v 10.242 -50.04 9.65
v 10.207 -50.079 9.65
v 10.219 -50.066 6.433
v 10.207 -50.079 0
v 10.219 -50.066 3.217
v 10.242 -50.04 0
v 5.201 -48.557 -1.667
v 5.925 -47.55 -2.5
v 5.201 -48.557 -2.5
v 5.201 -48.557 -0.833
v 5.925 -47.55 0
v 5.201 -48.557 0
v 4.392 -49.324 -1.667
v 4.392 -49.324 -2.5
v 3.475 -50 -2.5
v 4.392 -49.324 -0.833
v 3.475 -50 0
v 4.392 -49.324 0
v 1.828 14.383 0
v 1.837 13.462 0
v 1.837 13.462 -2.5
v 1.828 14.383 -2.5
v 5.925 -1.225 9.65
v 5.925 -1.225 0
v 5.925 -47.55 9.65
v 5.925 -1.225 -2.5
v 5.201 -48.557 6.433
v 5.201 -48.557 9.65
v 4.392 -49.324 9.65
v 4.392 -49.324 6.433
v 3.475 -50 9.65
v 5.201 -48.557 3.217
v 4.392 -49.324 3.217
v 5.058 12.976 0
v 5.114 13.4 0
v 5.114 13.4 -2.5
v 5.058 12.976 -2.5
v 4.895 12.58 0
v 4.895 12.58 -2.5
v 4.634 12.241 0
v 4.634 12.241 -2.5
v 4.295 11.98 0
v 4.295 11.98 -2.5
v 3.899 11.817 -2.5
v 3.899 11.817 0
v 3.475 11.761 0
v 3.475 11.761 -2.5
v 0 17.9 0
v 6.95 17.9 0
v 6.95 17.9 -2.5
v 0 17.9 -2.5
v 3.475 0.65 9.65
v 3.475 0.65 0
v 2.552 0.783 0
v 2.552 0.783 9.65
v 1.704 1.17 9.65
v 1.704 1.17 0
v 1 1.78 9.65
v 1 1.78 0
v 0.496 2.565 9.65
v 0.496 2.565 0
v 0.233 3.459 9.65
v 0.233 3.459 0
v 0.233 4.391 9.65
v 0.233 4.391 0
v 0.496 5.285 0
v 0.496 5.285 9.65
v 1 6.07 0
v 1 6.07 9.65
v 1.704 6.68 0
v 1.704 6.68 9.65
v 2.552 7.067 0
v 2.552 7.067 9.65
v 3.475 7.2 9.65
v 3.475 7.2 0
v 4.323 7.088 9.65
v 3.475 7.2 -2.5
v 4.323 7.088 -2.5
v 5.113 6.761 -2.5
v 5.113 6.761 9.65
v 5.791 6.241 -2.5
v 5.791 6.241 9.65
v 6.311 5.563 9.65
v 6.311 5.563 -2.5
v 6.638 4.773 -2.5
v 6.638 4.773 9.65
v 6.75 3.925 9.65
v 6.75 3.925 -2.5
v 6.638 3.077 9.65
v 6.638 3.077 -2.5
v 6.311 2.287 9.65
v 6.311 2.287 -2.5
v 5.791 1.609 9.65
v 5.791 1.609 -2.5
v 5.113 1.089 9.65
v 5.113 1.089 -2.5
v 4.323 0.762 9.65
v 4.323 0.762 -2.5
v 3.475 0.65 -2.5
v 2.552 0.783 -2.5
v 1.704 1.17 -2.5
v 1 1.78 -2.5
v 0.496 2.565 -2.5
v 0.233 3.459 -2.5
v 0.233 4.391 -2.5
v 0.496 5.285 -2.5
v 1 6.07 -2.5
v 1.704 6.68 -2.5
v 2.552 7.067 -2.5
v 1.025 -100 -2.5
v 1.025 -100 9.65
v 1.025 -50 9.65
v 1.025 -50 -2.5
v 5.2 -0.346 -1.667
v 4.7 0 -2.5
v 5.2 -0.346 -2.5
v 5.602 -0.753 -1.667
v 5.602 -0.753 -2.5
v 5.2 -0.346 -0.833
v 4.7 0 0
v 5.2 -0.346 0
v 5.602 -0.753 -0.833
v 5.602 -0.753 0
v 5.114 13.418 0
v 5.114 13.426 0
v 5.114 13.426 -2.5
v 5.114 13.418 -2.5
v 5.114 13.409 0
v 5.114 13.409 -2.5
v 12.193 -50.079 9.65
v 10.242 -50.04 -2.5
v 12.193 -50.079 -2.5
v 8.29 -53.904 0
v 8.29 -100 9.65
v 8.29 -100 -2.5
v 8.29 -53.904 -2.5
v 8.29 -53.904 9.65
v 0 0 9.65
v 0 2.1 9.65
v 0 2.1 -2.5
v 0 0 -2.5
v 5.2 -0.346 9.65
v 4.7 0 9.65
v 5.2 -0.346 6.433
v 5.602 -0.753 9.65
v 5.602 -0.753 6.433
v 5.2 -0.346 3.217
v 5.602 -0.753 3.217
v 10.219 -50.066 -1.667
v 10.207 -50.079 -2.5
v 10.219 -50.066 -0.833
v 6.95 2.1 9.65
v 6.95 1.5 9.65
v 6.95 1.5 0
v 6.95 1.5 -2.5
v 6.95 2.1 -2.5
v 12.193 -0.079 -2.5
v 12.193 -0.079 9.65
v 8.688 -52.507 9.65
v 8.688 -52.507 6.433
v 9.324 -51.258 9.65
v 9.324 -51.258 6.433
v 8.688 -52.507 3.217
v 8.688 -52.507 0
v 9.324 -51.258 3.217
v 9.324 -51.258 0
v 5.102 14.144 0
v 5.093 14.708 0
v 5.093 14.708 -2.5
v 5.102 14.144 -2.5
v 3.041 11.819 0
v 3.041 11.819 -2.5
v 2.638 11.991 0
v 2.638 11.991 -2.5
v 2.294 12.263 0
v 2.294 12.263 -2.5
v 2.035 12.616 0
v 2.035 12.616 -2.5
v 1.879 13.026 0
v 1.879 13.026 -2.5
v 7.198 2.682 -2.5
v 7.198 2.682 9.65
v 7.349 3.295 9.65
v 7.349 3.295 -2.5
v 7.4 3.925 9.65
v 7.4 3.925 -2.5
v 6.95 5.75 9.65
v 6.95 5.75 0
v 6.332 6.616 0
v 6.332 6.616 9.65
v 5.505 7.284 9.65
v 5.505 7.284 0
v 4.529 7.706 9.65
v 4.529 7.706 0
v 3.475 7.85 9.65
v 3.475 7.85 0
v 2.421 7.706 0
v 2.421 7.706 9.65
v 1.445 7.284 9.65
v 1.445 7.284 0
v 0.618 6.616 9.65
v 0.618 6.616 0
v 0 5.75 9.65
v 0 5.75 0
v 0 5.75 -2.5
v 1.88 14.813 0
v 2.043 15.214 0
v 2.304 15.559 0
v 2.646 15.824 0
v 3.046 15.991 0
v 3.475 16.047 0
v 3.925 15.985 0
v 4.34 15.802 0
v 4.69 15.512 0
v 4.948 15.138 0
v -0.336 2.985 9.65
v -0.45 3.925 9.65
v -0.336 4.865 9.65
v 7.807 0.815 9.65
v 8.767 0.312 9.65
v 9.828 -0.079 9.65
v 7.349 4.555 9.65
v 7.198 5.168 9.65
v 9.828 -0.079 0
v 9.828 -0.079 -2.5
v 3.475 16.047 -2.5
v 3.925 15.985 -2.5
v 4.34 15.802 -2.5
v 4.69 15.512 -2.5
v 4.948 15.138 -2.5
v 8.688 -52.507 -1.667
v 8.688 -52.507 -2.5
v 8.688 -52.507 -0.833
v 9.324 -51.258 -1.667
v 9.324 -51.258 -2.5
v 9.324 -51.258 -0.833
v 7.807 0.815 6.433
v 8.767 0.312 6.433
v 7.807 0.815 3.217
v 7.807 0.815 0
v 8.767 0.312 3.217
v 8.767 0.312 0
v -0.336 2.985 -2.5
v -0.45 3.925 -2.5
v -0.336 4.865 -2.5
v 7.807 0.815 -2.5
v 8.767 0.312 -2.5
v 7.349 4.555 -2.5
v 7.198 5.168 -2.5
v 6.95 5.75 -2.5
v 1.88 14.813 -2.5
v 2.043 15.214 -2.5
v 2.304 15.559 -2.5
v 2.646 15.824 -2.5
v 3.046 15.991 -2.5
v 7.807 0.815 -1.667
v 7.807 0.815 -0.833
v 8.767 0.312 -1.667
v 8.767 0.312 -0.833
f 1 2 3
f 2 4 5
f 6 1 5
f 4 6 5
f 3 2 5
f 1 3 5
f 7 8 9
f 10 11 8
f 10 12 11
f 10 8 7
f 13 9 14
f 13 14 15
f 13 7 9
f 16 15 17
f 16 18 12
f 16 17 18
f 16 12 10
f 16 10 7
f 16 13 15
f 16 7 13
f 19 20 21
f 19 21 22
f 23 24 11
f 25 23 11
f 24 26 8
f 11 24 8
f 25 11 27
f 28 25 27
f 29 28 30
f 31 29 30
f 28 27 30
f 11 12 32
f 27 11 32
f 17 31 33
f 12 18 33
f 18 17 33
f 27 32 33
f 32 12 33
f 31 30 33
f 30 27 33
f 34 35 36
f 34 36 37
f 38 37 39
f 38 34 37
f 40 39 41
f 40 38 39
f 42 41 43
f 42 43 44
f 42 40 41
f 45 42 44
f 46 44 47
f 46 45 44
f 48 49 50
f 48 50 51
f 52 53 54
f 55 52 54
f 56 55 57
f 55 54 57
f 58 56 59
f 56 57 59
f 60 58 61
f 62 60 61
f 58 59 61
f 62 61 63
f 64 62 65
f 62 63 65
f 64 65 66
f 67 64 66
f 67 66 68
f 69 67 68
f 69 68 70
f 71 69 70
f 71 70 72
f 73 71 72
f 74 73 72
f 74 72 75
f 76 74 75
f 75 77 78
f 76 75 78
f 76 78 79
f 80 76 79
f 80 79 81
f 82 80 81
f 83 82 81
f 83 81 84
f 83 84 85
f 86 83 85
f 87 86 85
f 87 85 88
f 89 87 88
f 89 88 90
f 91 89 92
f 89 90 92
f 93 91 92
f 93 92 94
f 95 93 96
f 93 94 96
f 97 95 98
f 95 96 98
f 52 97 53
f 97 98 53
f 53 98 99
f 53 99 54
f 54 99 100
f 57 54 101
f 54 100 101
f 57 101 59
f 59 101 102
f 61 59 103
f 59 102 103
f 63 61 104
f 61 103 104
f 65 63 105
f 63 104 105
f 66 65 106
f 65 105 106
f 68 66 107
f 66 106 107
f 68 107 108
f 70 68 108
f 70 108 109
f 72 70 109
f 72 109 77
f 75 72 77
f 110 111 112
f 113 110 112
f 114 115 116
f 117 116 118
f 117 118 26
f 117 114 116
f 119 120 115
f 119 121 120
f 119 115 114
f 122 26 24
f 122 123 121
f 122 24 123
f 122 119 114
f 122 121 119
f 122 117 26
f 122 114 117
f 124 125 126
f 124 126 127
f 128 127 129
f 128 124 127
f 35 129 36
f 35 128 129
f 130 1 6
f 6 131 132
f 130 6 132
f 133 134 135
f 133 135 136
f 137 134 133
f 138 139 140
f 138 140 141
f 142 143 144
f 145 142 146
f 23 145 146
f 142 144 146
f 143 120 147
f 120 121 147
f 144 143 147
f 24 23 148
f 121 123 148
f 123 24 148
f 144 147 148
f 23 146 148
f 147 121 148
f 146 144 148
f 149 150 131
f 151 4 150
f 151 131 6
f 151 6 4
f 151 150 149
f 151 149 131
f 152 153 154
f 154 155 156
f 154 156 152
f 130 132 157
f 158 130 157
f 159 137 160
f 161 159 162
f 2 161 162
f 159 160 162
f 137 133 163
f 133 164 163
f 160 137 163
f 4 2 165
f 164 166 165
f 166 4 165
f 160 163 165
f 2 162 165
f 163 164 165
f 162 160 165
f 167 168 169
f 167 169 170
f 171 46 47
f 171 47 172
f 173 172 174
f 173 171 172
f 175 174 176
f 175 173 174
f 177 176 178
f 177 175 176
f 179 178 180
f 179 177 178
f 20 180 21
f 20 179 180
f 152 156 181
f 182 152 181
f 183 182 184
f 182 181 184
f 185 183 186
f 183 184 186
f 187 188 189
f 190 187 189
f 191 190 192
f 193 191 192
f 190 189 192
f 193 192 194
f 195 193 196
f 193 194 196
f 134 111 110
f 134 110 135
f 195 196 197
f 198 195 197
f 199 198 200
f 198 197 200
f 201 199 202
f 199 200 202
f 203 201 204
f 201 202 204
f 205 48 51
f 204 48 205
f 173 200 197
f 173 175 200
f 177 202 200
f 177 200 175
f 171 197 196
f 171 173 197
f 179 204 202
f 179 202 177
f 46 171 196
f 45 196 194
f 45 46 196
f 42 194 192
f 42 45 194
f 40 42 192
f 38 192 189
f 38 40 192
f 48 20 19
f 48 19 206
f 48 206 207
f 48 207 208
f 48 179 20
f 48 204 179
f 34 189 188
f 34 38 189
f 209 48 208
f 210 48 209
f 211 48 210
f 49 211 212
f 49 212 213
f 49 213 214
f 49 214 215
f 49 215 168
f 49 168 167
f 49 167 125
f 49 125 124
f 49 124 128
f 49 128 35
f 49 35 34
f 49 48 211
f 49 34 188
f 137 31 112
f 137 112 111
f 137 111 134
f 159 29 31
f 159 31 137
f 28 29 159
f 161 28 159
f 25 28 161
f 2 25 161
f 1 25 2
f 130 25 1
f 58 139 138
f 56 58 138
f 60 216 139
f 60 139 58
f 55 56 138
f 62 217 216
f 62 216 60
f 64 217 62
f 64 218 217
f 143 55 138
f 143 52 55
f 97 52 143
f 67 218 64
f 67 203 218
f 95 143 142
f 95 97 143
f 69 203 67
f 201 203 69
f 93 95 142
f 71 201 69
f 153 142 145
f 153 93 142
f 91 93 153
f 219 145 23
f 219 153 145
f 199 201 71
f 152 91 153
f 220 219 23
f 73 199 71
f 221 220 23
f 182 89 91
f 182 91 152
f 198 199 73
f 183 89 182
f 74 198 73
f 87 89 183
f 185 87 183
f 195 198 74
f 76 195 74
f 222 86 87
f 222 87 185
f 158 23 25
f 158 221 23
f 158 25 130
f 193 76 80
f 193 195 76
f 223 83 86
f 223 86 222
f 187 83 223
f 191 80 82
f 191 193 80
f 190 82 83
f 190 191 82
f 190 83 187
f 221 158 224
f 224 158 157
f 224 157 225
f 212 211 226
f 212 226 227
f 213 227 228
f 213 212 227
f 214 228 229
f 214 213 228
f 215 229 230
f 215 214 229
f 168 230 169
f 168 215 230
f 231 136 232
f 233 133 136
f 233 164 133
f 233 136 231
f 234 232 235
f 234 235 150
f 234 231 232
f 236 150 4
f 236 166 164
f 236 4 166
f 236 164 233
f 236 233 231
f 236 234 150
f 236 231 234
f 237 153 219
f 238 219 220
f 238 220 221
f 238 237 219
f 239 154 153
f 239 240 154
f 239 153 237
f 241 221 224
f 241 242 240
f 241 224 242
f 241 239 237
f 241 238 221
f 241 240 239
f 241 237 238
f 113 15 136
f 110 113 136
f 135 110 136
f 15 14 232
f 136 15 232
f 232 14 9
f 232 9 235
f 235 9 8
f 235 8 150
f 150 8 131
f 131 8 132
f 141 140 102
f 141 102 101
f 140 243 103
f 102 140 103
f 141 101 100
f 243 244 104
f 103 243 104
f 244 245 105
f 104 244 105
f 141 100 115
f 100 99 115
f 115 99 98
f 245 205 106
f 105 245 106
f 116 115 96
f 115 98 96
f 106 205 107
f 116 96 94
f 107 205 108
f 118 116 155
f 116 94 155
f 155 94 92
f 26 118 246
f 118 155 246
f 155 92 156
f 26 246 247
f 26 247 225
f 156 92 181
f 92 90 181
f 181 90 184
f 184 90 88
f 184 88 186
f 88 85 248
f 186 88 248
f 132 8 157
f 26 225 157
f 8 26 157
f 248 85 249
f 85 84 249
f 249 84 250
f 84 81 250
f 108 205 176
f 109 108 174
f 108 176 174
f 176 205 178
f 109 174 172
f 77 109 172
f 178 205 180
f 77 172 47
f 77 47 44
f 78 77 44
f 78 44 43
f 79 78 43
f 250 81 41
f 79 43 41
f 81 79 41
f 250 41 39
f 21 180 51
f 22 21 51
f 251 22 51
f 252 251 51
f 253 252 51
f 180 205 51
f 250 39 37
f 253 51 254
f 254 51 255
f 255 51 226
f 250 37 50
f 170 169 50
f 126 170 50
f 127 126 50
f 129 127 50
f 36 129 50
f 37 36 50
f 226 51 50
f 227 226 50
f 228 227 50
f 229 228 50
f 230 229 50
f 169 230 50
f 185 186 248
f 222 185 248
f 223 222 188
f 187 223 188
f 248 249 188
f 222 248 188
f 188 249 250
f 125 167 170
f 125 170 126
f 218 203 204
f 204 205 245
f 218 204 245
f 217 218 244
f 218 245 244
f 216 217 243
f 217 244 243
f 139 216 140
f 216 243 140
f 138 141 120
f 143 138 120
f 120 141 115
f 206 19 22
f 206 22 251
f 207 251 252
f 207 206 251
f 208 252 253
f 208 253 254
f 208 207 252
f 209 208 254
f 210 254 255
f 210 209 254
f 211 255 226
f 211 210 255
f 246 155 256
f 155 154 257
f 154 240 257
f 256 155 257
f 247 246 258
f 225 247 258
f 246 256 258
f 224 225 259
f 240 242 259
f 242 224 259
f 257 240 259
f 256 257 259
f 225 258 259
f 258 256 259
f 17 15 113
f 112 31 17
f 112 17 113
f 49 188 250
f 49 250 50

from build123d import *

# Parameters (mm, degrees)
F0_W     = 2.45
F0_H     = 50
F1_DEPTH = 2.5
F2_DEPTH = 9.65
F3_DEPTH = 2.5
F4_DEPTH = 9.65
F5_DEPTH = 9.65
F6_DEPTH = 2.5


with BuildPart() as f1:
    # F0 (on Top) → F1 (new body)
    with BuildSketch(Plane.XY):
        with BuildLine():
            Line((0, 2.1001712409), (0, 0))
            Line((0, 0), (1.025, 0))
            Line((1.025, 0), (1.025, 0.8585484677))
            ThreePointArc((1.025, 0.8585484677), (0.4481513041, 1.426237912), (0, 2.1001712409))
        make_face()
        with BuildLine():
            Line((1.025, 0.8585484677), (1.025, 0))
            Line((1.025, 0), (3.475, 0))
            ThreePointArc((3.475, 0), (2.1769624937, 0.2208504846), (1.025, 0.8585484677))
        make_face()
        with BuildLine():
            ThreePointArc((0, 5.7498287591), (-0.45, 3.925), (0, 2.1001712409))
            Line((0, 2.1001712409), (0, 5.7498287591))
        make_face()
        with BuildLine():
            Line((0, 5.7498287591), (0, 2.1001712409))
            ThreePointArc((0, 2.1001712409), (0.4481513041, 1.426237912), (1.025, 0.8585484677))
            ThreePointArc((1.025, 0.8585484677), (2.1769624937, 0.2208504846), (3.475, 0))
            Line((3.475, 0), (3.475, 0.65))
            ThreePointArc((3.475, 0.65), (0.2, 3.925), (3.475, 7.2))
            Line((3.475, 7.2), (3.475, 7.85))
            ThreePointArc((3.475, 7.85), (1.4448310267, 7.2841723593), (0, 5.7498287591))
        make_face()
        with BuildLine():
            ThreePointArc((5.925, 0.8585484677), (4.7730375063, 0.2208504846), (3.475, 0))
            Line((3.475, 0), (4.7, 0))
            Line((4.7, 0), (5.925, 0))
            Line((5.925, 0), (5.925, 0.8585484677))
        make_face()
        with BuildLine():
            Line((3.475, 0.65), (3.475, 0))
            ThreePointArc((3.475, 0), (4.7730375063, 0.2208504846), (5.925, 0.8585484677))
            ThreePointArc((5.925, 0.8585484677), (6.5018486959, 1.426237912), (6.95, 2.1001712409))
            Line((6.95, 2.1001712409), (6.95, 5.7498287591))
            ThreePointArc((6.95, 5.7498287591), (5.5051689733, 7.2841723593), (3.475, 7.85))
            Line((3.475, 7.85), (3.475, 7.2))
            ThreePointArc((3.475, 7.2), (5.7907747084, 6.2407747084), (6.75, 3.925))
            ThreePointArc((6.75, 3.925), (5.7907747084, 1.6092252916), (3.475, 0.65))
        make_face()
        with BuildLine():
            Line((0, 7.85), (0, 5.7498287591))
            ThreePointArc((0, 5.7498287591), (1.4448310267, 7.2841723593), (3.475, 7.85))
            ThreePointArc((3.475, 7.85), (5.5051689733, 7.2841723593), (6.95, 5.7498287591))
            Line((6.95, 5.7498287591), (6.95, 17.9))
            Line((6.95, 17.9), (3.475, 17.9))
            Line((3.475, 17.9), (0, 17.9))
            Line((0, 17.9), (0, 7.85))
        make_face()
        with BuildLine():
            ThreePointArc((1.8276640256, 14.3833613398), (2.3042302705, 15.55900427), (3.475, 16.0474200003))
            ThreePointArc((3.475, 16.0474200003), (4.5253988967, 15.6691157612), (5.0933824344, 14.7079463483))
            Line((5.0933824344, 14.7079463483), (5.1024433757, 14.1442252627))
            Line((5.1024433757, 14.1442252627), (5.113982201, 13.4263440945))
            ThreePointArc((5.113982201, 13.4263440945), (5.1141409801, 13.4131724726), (5.1141939076, 13.4))
            ThreePointArc((5.1141939076, 13.4), (4.6340851277, 12.2409148723), (3.475, 11.7608060924))
            ThreePointArc((3.475, 11.7608060924), (2.2942628451, 12.2629791393), (1.8369719791, 13.4618131819))
            Line((1.8369719791, 13.4618131819), (1.8276640256, 14.3833613398))
        make_face(mode=Mode.SUBTRACT)
        with BuildLine():
            Line((5.925, 0), (4.7, 0))
            add(Edge.make_bspline(
                [(4.7, 0), (5.2537494339, -0.3164176305), (5.6369397789, -0.7196032093), (5.925, -1.225)],
                knots=[0, 0, 0, 0, 1.7324116139, 1.7324116139, 1.7324116139, 1.7324116139], degree=3))
            Line((5.925, -1.225), (5.925, -0.079424061))
            Line((5.925, -0.079424061), (5.925, 0))
        make_face()
        with BuildLine():
            ThreePointArc((6.95, 2.1001712409), (6.5018486959, 1.426237912), (5.925, 0.8585484677))
            Line((5.925, 0.8585484677), (5.925, 0))
            Line((5.925, 0), (6.95, 0))
            Line((6.95, 0), (6.95, 1.44))
            Line((6.95, 1.44), (6.95, 1.5))
            Line((6.95, 1.5), (6.95, 2.1001712409))
        make_face()
        Polygon((6.95, 0), (5.925, 0), (5.925, -0.079424061), (5.925, -1.225), (5.925, -21.3844068348), (5.925, -22.55), (5.925, -22.9875), (5.925, -25), (9.8284865708, -25), (9.8284865708, -0.079424061), align=None)
        with BuildLine():
            Line((6.95, 5.7498287591), (6.95, 2.1001712409))
            ThreePointArc((6.95, 2.1001712409), (7.2858398025, 2.9852526935), (7.4, 3.925))
            ThreePointArc((7.4, 3.925), (7.2858398025, 4.8647473065), (6.95, 5.7498287591))
        make_face()
        with BuildLine():
            Line((6.95, 1.44), (6.95, 0))
            Line((6.95, 0), (9.8284865708, -0.079424061))
            add(Edge.make_bspline(
                [(6.95, 1.5), (7.7566024847, 0.7003984647), (8.7155010551, 0.2800084476), (9.8284865708, -0.079424061)],
                knots=[0, 0, 0, 0, 3.2833314336, 3.2833314336, 3.2833314336, 3.2833314336], degree=3))
            Line((6.95, 1.5), (6.95, 1.44))
        make_face()
        Polygon((12.1934865708, -0.079424061), (9.8284865708, -0.079424061), (9.8284865708, -25), (9.8284865708, -50.0313035152), (10.2417432854, -50.0397120305), (12.1934865708, -50.079424061), align=None)
        Polygon((9.8284865708, -25), (5.925, -25), (5.925, -26.9515), (5.925, -28.903), (5.925, -47.55), (5.925, -50), (8.29, -50), (9.8284865708, -50.0313035152), align=None)
        with Locations((2.25, -75)):
            Rectangle(F0_W, F0_H)
        with BuildLine():
            Line((10.2417432854, -50.0397120305), (9.8284865708, -50.0313035152))
            Line((9.8284865708, -50.0313035152), (9.8284865708, -50.0397120305))
            Line((9.8284865708, -50.0397120305), (9.8284865708, -50.079424061))
            Line((9.8284865708, -50.079424061), (10.207343012, -50.079424061))
            add(Edge.make_bspline(
                [(10.207343012, -50.079424061), (10.2187605889, -50.0661890592), (10.230227327, -50.0529518896), (10.2417432854, -50.0397120305)],
                knots=[4.2808358806, 4.2808358806, 4.2808358806, 4.2808358806, 4.3292058583, 4.3292058583, 4.3292058583, 4.3292058583], degree=3))
        make_face()
        Polygon((9.8284865708, -50.0397120305), (9.8284865708, -50.0313035152), (8.29, -50), (8.29, -50.0240602729), align=None)
        Polygon((5.925, -50), (3.475, -50), (3.475, -100), (5.925, -100), (5.925, -52.0125), align=None)
        with BuildLine():
            add(Edge.make_bspline(
                [(5.925, -47.55), (5.2342489362, -48.7282052636), (4.4546769932, -49.3181198835), (3.475, -50)],
                knots=[0, 0, 0, 0, 3.4648232278, 3.4648232278, 3.4648232278, 3.4648232278], degree=3))
            Line((3.475, -50), (5.925, -50))
            Line((5.925, -50), (5.925, -47.55))
        make_face()
        with BuildLine():
            Line((9.8284865708, -50.079424061), (9.8284865708, -50.0397120305))
            Line((9.8284865708, -50.0397120305), (8.29, -50.0240602729))
            Line((8.29, -50.0240602729), (8.29, -53.904))
            add(Edge.make_bspline(
                [(8.29, -53.904), (8.5714472143, -52.4050904341), (9.1968655396, -51.250747129), (10.207343012, -50.079424061)],
                knots=[0, 0, 0, 0, 4.2808358806, 4.2808358806, 4.2808358806, 4.2808358806], degree=3))
            Line((10.207343012, -50.079424061), (9.8284865708, -50.079424061))
        make_face()
        Polygon((8.29, -50.0240602729), (8.29, -50), (5.925, -50), align=None)
        Polygon((8.29, -50.0240602729), (5.925, -50), (5.925, -52.0125), (5.925, -100), (8.29, -100), (8.29, -53.904), align=None)
    extrude(amount=-F1_DEPTH)

    # F0 (on Top) → F2 (join)
    with BuildSketch(Plane.XY):
        with BuildLine():
            Line((3.475, 0.65), (3.475, 0))
            ThreePointArc((3.475, 0), (4.7730375063, 0.2208504846), (5.925, 0.8585484677))
            ThreePointArc((5.925, 0.8585484677), (6.5018486959, 1.426237912), (6.95, 2.1001712409))
            Line((6.95, 2.1001712409), (6.95, 5.7498287591))
            ThreePointArc((6.95, 5.7498287591), (5.5051689733, 7.2841723593), (3.475, 7.85))
            Line((3.475, 7.85), (3.475, 7.2))
            ThreePointArc((3.475, 7.2), (5.7907747084, 6.2407747084), (6.75, 3.925))
            ThreePointArc((6.75, 3.925), (5.7907747084, 1.6092252916), (3.475, 0.65))
        make_face()
        with BuildLine():
            Line((0, 5.7498287591), (0, 2.1001712409))
            ThreePointArc((0, 2.1001712409), (0.4481513041, 1.426237912), (1.025, 0.8585484677))
            ThreePointArc((1.025, 0.8585484677), (2.1769624937, 0.2208504846), (3.475, 0))
            Line((3.475, 0), (3.475, 0.65))
            ThreePointArc((3.475, 0.65), (0.2, 3.925), (3.475, 7.2))
            Line((3.475, 7.2), (3.475, 7.85))
            ThreePointArc((3.475, 7.85), (1.4448310267, 7.2841723593), (0, 5.7498287591))
        make_face()
        with BuildLine():
            Line((6.95, 5.7498287591), (6.95, 2.1001712409))
            ThreePointArc((6.95, 2.1001712409), (7.2858398025, 2.9852526935), (7.4, 3.925))
            ThreePointArc((7.4, 3.925), (7.2858398025, 4.8647473065), (6.95, 5.7498287591))
        make_face()
        with BuildLine():
            ThreePointArc((0, 5.7498287591), (-0.45, 3.925), (0, 2.1001712409))
            Line((0, 2.1001712409), (0, 5.7498287591))
        make_face()
        with BuildLine():
            Line((6.95, 1.44), (6.95, 0))
            Line((6.95, 0), (9.8284865708, -0.079424061))
            add(Edge.make_bspline(
                [(6.95, 1.5), (7.7566024847, 0.7003984647), (8.7155010551, 0.2800084476), (9.8284865708, -0.079424061)],
                knots=[0, 0, 0, 0, 3.2833314336, 3.2833314336, 3.2833314336, 3.2833314336], degree=3))
            Line((6.95, 1.5), (6.95, 1.44))
        make_face()
        with BuildLine():
            ThreePointArc((6.95, 2.1001712409), (6.5018486959, 1.426237912), (5.925, 0.8585484677))
            Line((5.925, 0.8585484677), (5.925, 0))
            Line((5.925, 0), (6.95, 0))
            Line((6.95, 0), (6.95, 1.44))
            Line((6.95, 1.44), (6.95, 1.5))
            Line((6.95, 1.5), (6.95, 2.1001712409))
        make_face()
        with BuildLine():
            ThreePointArc((5.925, 0.8585484677), (4.7730375063, 0.2208504846), (3.475, 0))
            Line((3.475, 0), (4.7, 0))
            Line((4.7, 0), (5.925, 0))
            Line((5.925, 0), (5.925, 0.8585484677))
        make_face()
        with BuildLine():
            Line((1.025, 0.8585484677), (1.025, 0))
            Line((1.025, 0), (3.475, 0))
            ThreePointArc((3.475, 0), (2.1769624937, 0.2208504846), (1.025, 0.8585484677))
        make_face()
        with BuildLine():
            Line((0, 2.1001712409), (0, 0))
            Line((0, 0), (1.025, 0))
            Line((1.025, 0), (1.025, 0.8585484677))
            ThreePointArc((1.025, 0.8585484677), (0.4481513041, 1.426237912), (0, 2.1001712409))
        make_face()
        Polygon((6.95, 0), (5.925, 0), (5.925, -0.079424061), (5.925, -1.225), (5.925, -21.3844068348), (5.925, -22.55), (5.925, -22.9875), (5.925, -25), (9.8284865708, -25), (9.8284865708, -0.079424061), align=None)
        with BuildLine():
            Line((5.925, 0), (4.7, 0))
            add(Edge.make_bspline(
                [(4.7, 0), (5.2537494339, -0.3164176305), (5.6369397789, -0.7196032093), (5.925, -1.225)],
                knots=[0, 0, 0, 0, 1.7324116139, 1.7324116139, 1.7324116139, 1.7324116139], degree=3))
            Line((5.925, -1.225), (5.925, -0.079424061))
            Line((5.925, -0.079424061), (5.925, 0))
        make_face()
        Polygon((9.8284865708, -25), (5.925, -25), (5.925, -26.9515), (5.925, -28.903), (5.925, -47.55), (5.925, -50), (8.29, -50), (9.8284865708, -50.0313035152), align=None)
        with BuildLine():
            add(Edge.make_bspline(
                [(5.925, -47.55), (5.2342489362, -48.7282052636), (4.4546769932, -49.3181198835), (3.475, -50)],
                knots=[0, 0, 0, 0, 3.4648232278, 3.4648232278, 3.4648232278, 3.4648232278], degree=3))
            Line((3.475, -50), (5.925, -50))
            Line((5.925, -50), (5.925, -47.55))
        make_face()
        Polygon((8.29, -50.0240602729), (5.925, -50), (5.925, -52.0125), (5.925, -100), (8.29, -100), (8.29, -53.904), align=None)
        Polygon((5.925, -50), (3.475, -50), (3.475, -100), (5.925, -100), (5.925, -52.0125), align=None)
        with Locations((2.25, -75)):
            Rectangle(F0_W, F0_H)
    extrude(amount=F2_DEPTH)

    # F0 (on Top) → F3 (join)
    with BuildSketch(Plane.XY):
        Polygon((12.1934865708, -0.079424061), (9.8284865708, -0.079424061), (9.8284865708, -25), (9.8284865708, -50.0313035152), (10.2417432854, -50.0397120305), (12.1934865708, -50.079424061), align=None)
        Polygon((8.29, -50.0240602729), (5.925, -50), (5.925, -52.0125), (5.925, -100), (8.29, -100), (8.29, -53.904), align=None)
        with BuildLine():
            Line((9.8284865708, -50.079424061), (9.8284865708, -50.0397120305))
            Line((9.8284865708, -50.0397120305), (8.29, -50.0240602729))
            Line((8.29, -50.0240602729), (8.29, -53.904))
            add(Edge.make_bspline(
                [(8.29, -53.904), (8.5714472143, -52.4050904341), (9.1968655396, -51.250747129), (10.207343012, -50.079424061)],
                knots=[0, 0, 0, 0, 4.2808358806, 4.2808358806, 4.2808358806, 4.2808358806], degree=3))
            Line((10.207343012, -50.079424061), (9.8284865708, -50.079424061))
        make_face()
    extrude(amount=-F3_DEPTH)

    # F0 (on Top) → F4 (join)
    with BuildSketch(Plane.XY):
        with BuildLine():
            Line((0, 2.1001712409), (0, 0))
            Line((0, 0), (1.025, 0))
            Line((1.025, 0), (1.025, 0.8585484677))
            ThreePointArc((1.025, 0.8585484677), (0.4481513041, 1.426237912), (0, 2.1001712409))
        make_face()
        with BuildLine():
            Line((1.025, 0.8585484677), (1.025, 0))
            Line((1.025, 0), (3.475, 0))
            ThreePointArc((3.475, 0), (2.1769624937, 0.2208504846), (1.025, 0.8585484677))
        make_face()
        with BuildLine():
            ThreePointArc((0, 5.7498287591), (-0.45, 3.925), (0, 2.1001712409))
            Line((0, 2.1001712409), (0, 5.7498287591))
        make_face()
        with BuildLine():
            Line((0, 5.7498287591), (0, 2.1001712409))
            ThreePointArc((0, 2.1001712409), (0.4481513041, 1.426237912), (1.025, 0.8585484677))
            ThreePointArc((1.025, 0.8585484677), (2.1769624937, 0.2208504846), (3.475, 0))
            Line((3.475, 0), (3.475, 0.65))
            ThreePointArc((3.475, 0.65), (0.2, 3.925), (3.475, 7.2))
            Line((3.475, 7.2), (3.475, 7.85))
            ThreePointArc((3.475, 7.85), (1.4448310267, 7.2841723593), (0, 5.7498287591))
        make_face()
        with BuildLine():
            ThreePointArc((5.925, 0.8585484677), (4.7730375063, 0.2208504846), (3.475, 0))
            Line((3.475, 0), (4.7, 0))
            Line((4.7, 0), (5.925, 0))
            Line((5.925, 0), (5.925, 0.8585484677))
        make_face()
        with BuildLine():
            Line((3.475, 0.65), (3.475, 0))
            ThreePointArc((3.475, 0), (4.7730375063, 0.2208504846), (5.925, 0.8585484677))
            ThreePointArc((5.925, 0.8585484677), (6.5018486959, 1.426237912), (6.95, 2.1001712409))
            Line((6.95, 2.1001712409), (6.95, 5.7498287591))
            ThreePointArc((6.95, 5.7498287591), (5.5051689733, 7.2841723593), (3.475, 7.85))
            Line((3.475, 7.85), (3.475, 7.2))
            ThreePointArc((3.475, 7.2), (5.7907747084, 6.2407747084), (6.75, 3.925))
            ThreePointArc((6.75, 3.925), (5.7907747084, 1.6092252916), (3.475, 0.65))
        make_face()
        with BuildLine():
            Line((5.925, 0), (4.7, 0))
            add(Edge.make_bspline(
                [(4.7, 0), (5.2537494339, -0.3164176305), (5.6369397789, -0.7196032093), (5.925, -1.225)],
                knots=[0, 0, 0, 0, 1.7324116139, 1.7324116139, 1.7324116139, 1.7324116139], degree=3))
            Line((5.925, -1.225), (5.925, -0.079424061))
            Line((5.925, -0.079424061), (5.925, 0))
        make_face()
        with BuildLine():
            ThreePointArc((6.95, 2.1001712409), (6.5018486959, 1.426237912), (5.925, 0.8585484677))
            Line((5.925, 0.8585484677), (5.925, 0))
            Line((5.925, 0), (6.95, 0))
            Line((6.95, 0), (6.95, 1.44))
            Line((6.95, 1.44), (6.95, 1.5))
            Line((6.95, 1.5), (6.95, 2.1001712409))
        make_face()
        Polygon((6.95, 0), (5.925, 0), (5.925, -0.079424061), (5.925, -1.225), (5.925, -21.3844068348), (5.925, -22.55), (5.925, -22.9875), (5.925, -25), (9.8284865708, -25), (9.8284865708, -0.079424061), align=None)
        with BuildLine():
            Line((6.95, 5.7498287591), (6.95, 2.1001712409))
            ThreePointArc((6.95, 2.1001712409), (7.2858398025, 2.9852526935), (7.4, 3.925))
            ThreePointArc((7.4, 3.925), (7.2858398025, 4.8647473065), (6.95, 5.7498287591))
        make_face()
        with BuildLine():
            Line((6.95, 1.44), (6.95, 0))
            Line((6.95, 0), (9.8284865708, -0.079424061))
            add(Edge.make_bspline(
                [(6.95, 1.5), (7.7566024847, 0.7003984647), (8.7155010551, 0.2800084476), (9.8284865708, -0.079424061)],
                knots=[0, 0, 0, 0, 3.2833314336, 3.2833314336, 3.2833314336, 3.2833314336], degree=3))
            Line((6.95, 1.5), (6.95, 1.44))
        make_face()
        Polygon((12.1934865708, -0.079424061), (9.8284865708, -0.079424061), (9.8284865708, -25), (9.8284865708, -50.0313035152), (10.2417432854, -50.0397120305), (12.1934865708, -50.079424061), align=None)
        with BuildLine():
            Line((9.8284865708, -50.079424061), (9.8284865708, -50.0397120305))
            Line((9.8284865708, -50.0397120305), (8.29, -50.0240602729))
            Line((8.29, -50.0240602729), (8.29, -53.904))
            add(Edge.make_bspline(
                [(8.29, -53.904), (8.5714472143, -52.4050904341), (9.1968655396, -51.250747129), (10.207343012, -50.079424061)],
                knots=[0, 0, 0, 0, 4.2808358806, 4.2808358806, 4.2808358806, 4.2808358806], degree=3))
            Line((10.207343012, -50.079424061), (9.8284865708, -50.079424061))
        make_face()
        Polygon((8.29, -50.0240602729), (5.925, -50), (5.925, -52.0125), (5.925, -100), (8.29, -100), (8.29, -53.904), align=None)
    extrude(amount=F4_DEPTH)

    # F0 (on Top) → F5 (join)
    with BuildSketch(Plane.XY):
        with BuildLine():
            Line((0, 2.1001712409), (0, 0))
            Line((0, 0), (1.025, 0))
            Line((1.025, 0), (1.025, 0.8585484677))
            ThreePointArc((1.025, 0.8585484677), (0.4481513041, 1.426237912), (0, 2.1001712409))
        make_face()
        with BuildLine():
            Line((1.025, 0.8585484677), (1.025, 0))
            Line((1.025, 0), (3.475, 0))
            ThreePointArc((3.475, 0), (2.1769624937, 0.2208504846), (1.025, 0.8585484677))
        make_face()
        with BuildLine():
            ThreePointArc((0, 5.7498287591), (-0.45, 3.925), (0, 2.1001712409))
            Line((0, 2.1001712409), (0, 5.7498287591))
        make_face()
        with BuildLine():
            Line((0, 5.7498287591), (0, 2.1001712409))
            ThreePointArc((0, 2.1001712409), (0.4481513041, 1.426237912), (1.025, 0.8585484677))
            ThreePointArc((1.025, 0.8585484677), (2.1769624937, 0.2208504846), (3.475, 0))
            Line((3.475, 0), (3.475, 0.65))
            ThreePointArc((3.475, 0.65), (0.2, 3.925), (3.475, 7.2))
            Line((3.475, 7.2), (3.475, 7.85))
            ThreePointArc((3.475, 7.85), (1.4448310267, 7.2841723593), (0, 5.7498287591))
        make_face()
        with BuildLine():
            ThreePointArc((5.925, 0.8585484677), (4.7730375063, 0.2208504846), (3.475, 0))
            Line((3.475, 0), (4.7, 0))
            Line((4.7, 0), (5.925, 0))
            Line((5.925, 0), (5.925, 0.8585484677))
        make_face()
        with BuildLine():
            Line((3.475, 0.65), (3.475, 0))
            ThreePointArc((3.475, 0), (4.7730375063, 0.2208504846), (5.925, 0.8585484677))
            ThreePointArc((5.925, 0.8585484677), (6.5018486959, 1.426237912), (6.95, 2.1001712409))
            Line((6.95, 2.1001712409), (6.95, 5.7498287591))
            ThreePointArc((6.95, 5.7498287591), (5.5051689733, 7.2841723593), (3.475, 7.85))
            Line((3.475, 7.85), (3.475, 7.2))
            ThreePointArc((3.475, 7.2), (5.7907747084, 6.2407747084), (6.75, 3.925))
            ThreePointArc((6.75, 3.925), (5.7907747084, 1.6092252916), (3.475, 0.65))
        make_face()
        with BuildLine():
            Line((5.925, 0), (4.7, 0))
            add(Edge.make_bspline(
                [(4.7, 0), (5.2537494339, -0.3164176305), (5.6369397789, -0.7196032093), (5.925, -1.225)],
                knots=[0, 0, 0, 0, 1.7324116139, 1.7324116139, 1.7324116139, 1.7324116139], degree=3))
            Line((5.925, -1.225), (5.925, -0.079424061))
            Line((5.925, -0.079424061), (5.925, 0))
        make_face()
        with BuildLine():
            ThreePointArc((6.95, 2.1001712409), (6.5018486959, 1.426237912), (5.925, 0.8585484677))
            Line((5.925, 0.8585484677), (5.925, 0))
            Line((5.925, 0), (6.95, 0))
            Line((6.95, 0), (6.95, 1.44))
            Line((6.95, 1.44), (6.95, 1.5))
            Line((6.95, 1.5), (6.95, 2.1001712409))
        make_face()
        Polygon((6.95, 0), (5.925, 0), (5.925, -0.079424061), (5.925, -1.225), (5.925, -21.3844068348), (5.925, -22.55), (5.925, -22.9875), (5.925, -25), (9.8284865708, -25), (9.8284865708, -0.079424061), align=None)
        with BuildLine():
            Line((6.95, 5.7498287591), (6.95, 2.1001712409))
            ThreePointArc((6.95, 2.1001712409), (7.2858398025, 2.9852526935), (7.4, 3.925))
            ThreePointArc((7.4, 3.925), (7.2858398025, 4.8647473065), (6.95, 5.7498287591))
        make_face()
        with BuildLine():
            Line((6.95, 1.44), (6.95, 0))
            Line((6.95, 0), (9.8284865708, -0.079424061))
            add(Edge.make_bspline(
                [(6.95, 1.5), (7.7566024847, 0.7003984647), (8.7155010551, 0.2800084476), (9.8284865708, -0.079424061)],
                knots=[0, 0, 0, 0, 3.2833314336, 3.2833314336, 3.2833314336, 3.2833314336], degree=3))
            Line((6.95, 1.5), (6.95, 1.44))
        make_face()
        Polygon((12.1934865708, -0.079424061), (9.8284865708, -0.079424061), (9.8284865708, -25), (9.8284865708, -50.0313035152), (10.2417432854, -50.0397120305), (12.1934865708, -50.079424061), align=None)
        Polygon((9.8284865708, -25), (5.925, -25), (5.925, -26.9515), (5.925, -28.903), (5.925, -47.55), (5.925, -50), (8.29, -50), (9.8284865708, -50.0313035152), align=None)
        with Locations((2.25, -75)):
            Rectangle(F0_W, F0_H)
        with BuildLine():
            Line((10.2417432854, -50.0397120305), (9.8284865708, -50.0313035152))
            Line((9.8284865708, -50.0313035152), (9.8284865708, -50.0397120305))
            Line((9.8284865708, -50.0397120305), (9.8284865708, -50.079424061))
            Line((9.8284865708, -50.079424061), (10.207343012, -50.079424061))
            add(Edge.make_bspline(
                [(10.207343012, -50.079424061), (10.2187605889, -50.0661890592), (10.230227327, -50.0529518896), (10.2417432854, -50.0397120305)],
                knots=[4.2808358806, 4.2808358806, 4.2808358806, 4.2808358806, 4.3292058583, 4.3292058583, 4.3292058583, 4.3292058583], degree=3))
        make_face()
        Polygon((9.8284865708, -50.0397120305), (9.8284865708, -50.0313035152), (8.29, -50), (8.29, -50.0240602729), align=None)
        Polygon((5.925, -50), (3.475, -50), (3.475, -100), (5.925, -100), (5.925, -52.0125), align=None)
        with BuildLine():
            add(Edge.make_bspline(
                [(5.925, -47.55), (5.2342489362, -48.7282052636), (4.4546769932, -49.3181198835), (3.475, -50)],
                knots=[0, 0, 0, 0, 3.4648232278, 3.4648232278, 3.4648232278, 3.4648232278], degree=3))
            Line((3.475, -50), (5.925, -50))
            Line((5.925, -50), (5.925, -47.55))
        make_face()
        Polygon((8.29, -50.0240602729), (8.29, -50), (5.925, -50), align=None)
    extrude(amount=F5_DEPTH)

    # F0 (on Top) → F6 (join)
    with BuildSketch(Plane.XY):
        with BuildLine():
            Line((0, 2.1001712409), (0, 0))
            Line((0, 0), (1.025, 0))
            Line((1.025, 0), (1.025, 0.8585484677))
            ThreePointArc((1.025, 0.8585484677), (0.4481513041, 1.426237912), (0, 2.1001712409))
        make_face()
        with BuildLine():
            Line((1.025, 0.8585484677), (1.025, 0))
            Line((1.025, 0), (3.475, 0))
            ThreePointArc((3.475, 0), (2.1769624937, 0.2208504846), (1.025, 0.8585484677))
        make_face()
        with BuildLine():
            ThreePointArc((0, 5.7498287591), (-0.45, 3.925), (0, 2.1001712409))
            Line((0, 2.1001712409), (0, 5.7498287591))
        make_face()
        with BuildLine():
            Line((0, 5.7498287591), (0, 2.1001712409))
            ThreePointArc((0, 2.1001712409), (0.4481513041, 1.426237912), (1.025, 0.8585484677))
            ThreePointArc((1.025, 0.8585484677), (2.1769624937, 0.2208504846), (3.475, 0))
            Line((3.475, 0), (3.475, 0.65))
            ThreePointArc((3.475, 0.65), (0.2, 3.925), (3.475, 7.2))
            Line((3.475, 7.2), (3.475, 7.85))
            ThreePointArc((3.475, 7.85), (1.4448310267, 7.2841723593), (0, 5.7498287591))
        make_face()
        with BuildLine():
            ThreePointArc((5.925, 0.8585484677), (4.7730375063, 0.2208504846), (3.475, 0))
            Line((3.475, 0), (4.7, 0))
            Line((4.7, 0), (5.925, 0))
            Line((5.925, 0), (5.925, 0.8585484677))
        make_face()
        with BuildLine():
            Line((3.475, 0.65), (3.475, 0))
            ThreePointArc((3.475, 0), (4.7730375063, 0.2208504846), (5.925, 0.8585484677))
            ThreePointArc((5.925, 0.8585484677), (6.5018486959, 1.426237912), (6.95, 2.1001712409))
            Line((6.95, 2.1001712409), (6.95, 5.7498287591))
            ThreePointArc((6.95, 5.7498287591), (5.5051689733, 7.2841723593), (3.475, 7.85))
            Line((3.475, 7.85), (3.475, 7.2))
            ThreePointArc((3.475, 7.2), (5.7907747084, 6.2407747084), (6.75, 3.925))
            ThreePointArc((6.75, 3.925), (5.7907747084, 1.6092252916), (3.475, 0.65))
        make_face()
        with BuildLine():
            Line((0, 7.85), (0, 5.7498287591))
            ThreePointArc((0, 5.7498287591), (1.4448310267, 7.2841723593), (3.475, 7.85))
            ThreePointArc((3.475, 7.85), (5.5051689733, 7.2841723593), (6.95, 5.7498287591))
            Line((6.95, 5.7498287591), (6.95, 17.9))
            Line((6.95, 17.9), (3.475, 17.9))
            Line((3.475, 17.9), (0, 17.9))
            Line((0, 17.9), (0, 7.85))
        make_face()
        with BuildLine():
            ThreePointArc((1.8276640256, 14.3833613398), (2.3042302705, 15.55900427), (3.475, 16.0474200003))
            ThreePointArc((3.475, 16.0474200003), (4.5253988967, 15.6691157612), (5.0933824344, 14.7079463483))
            Line((5.0933824344, 14.7079463483), (5.1024433757, 14.1442252627))
            Line((5.1024433757, 14.1442252627), (5.113982201, 13.4263440945))
            ThreePointArc((5.113982201, 13.4263440945), (5.1141409801, 13.4131724726), (5.1141939076, 13.4))
            ThreePointArc((5.1141939076, 13.4), (4.6340851277, 12.2409148723), (3.475, 11.7608060924))
            ThreePointArc((3.475, 11.7608060924), (2.2942628451, 12.2629791393), (1.8369719791, 13.4618131819))
            Line((1.8369719791, 13.4618131819), (1.8276640256, 14.3833613398))
        make_face(mode=Mode.SUBTRACT)
        with BuildLine():
            Line((5.925, 0), (4.7, 0))
            add(Edge.make_bspline(
                [(4.7, 0), (5.2537494339, -0.3164176305), (5.6369397789, -0.7196032093), (5.925, -1.225)],
                knots=[0, 0, 0, 0, 1.7324116139, 1.7324116139, 1.7324116139, 1.7324116139], degree=3))
            Line((5.925, -1.225), (5.925, -0.079424061))
            Line((5.925, -0.079424061), (5.925, 0))
        make_face()
        with BuildLine():
            ThreePointArc((6.95, 2.1001712409), (6.5018486959, 1.426237912), (5.925, 0.8585484677))
            Line((5.925, 0.8585484677), (5.925, 0))
            Line((5.925, 0), (6.95, 0))
            Line((6.95, 0), (6.95, 1.44))
            Line((6.95, 1.44), (6.95, 1.5))
            Line((6.95, 1.5), (6.95, 2.1001712409))
        make_face()
        Polygon((6.95, 0), (5.925, 0), (5.925, -0.079424061), (5.925, -1.225), (5.925, -21.3844068348), (5.925, -22.55), (5.925, -22.9875), (5.925, -25), (9.8284865708, -25), (9.8284865708, -0.079424061), align=None)
        with BuildLine():
            Line((6.95, 5.7498287591), (6.95, 2.1001712409))
            ThreePointArc((6.95, 2.1001712409), (7.2858398025, 2.9852526935), (7.4, 3.925))
            ThreePointArc((7.4, 3.925), (7.2858398025, 4.8647473065), (6.95, 5.7498287591))
        make_face()
        with BuildLine():
            Line((6.95, 1.44), (6.95, 0))
            Line((6.95, 0), (9.8284865708, -0.079424061))
            add(Edge.make_bspline(
                [(6.95, 1.5), (7.7566024847, 0.7003984647), (8.7155010551, 0.2800084476), (9.8284865708, -0.079424061)],
                knots=[0, 0, 0, 0, 3.2833314336, 3.2833314336, 3.2833314336, 3.2833314336], degree=3))
            Line((6.95, 1.5), (6.95, 1.44))
        make_face()
        Polygon((12.1934865708, -0.079424061), (9.8284865708, -0.079424061), (9.8284865708, -25), (9.8284865708, -50.0313035152), (10.2417432854, -50.0397120305), (12.1934865708, -50.079424061), align=None)
        Polygon((9.8284865708, -25), (5.925, -25), (5.925, -26.9515), (5.925, -28.903), (5.925, -47.55), (5.925, -50), (8.29, -50), (9.8284865708, -50.0313035152), align=None)
        with Locations((2.25, -75)):
            Rectangle(F0_W, F0_H)
        with BuildLine():
            Line((10.2417432854, -50.0397120305), (9.8284865708, -50.0313035152))
            Line((9.8284865708, -50.0313035152), (9.8284865708, -50.0397120305))
            Line((9.8284865708, -50.0397120305), (9.8284865708, -50.079424061))
            Line((9.8284865708, -50.079424061), (10.207343012, -50.079424061))
            add(Edge.make_bspline(
                [(10.207343012, -50.079424061), (10.2187605889, -50.0661890592), (10.230227327, -50.0529518896), (10.2417432854, -50.0397120305)],
                knots=[4.2808358806, 4.2808358806, 4.2808358806, 4.2808358806, 4.3292058583, 4.3292058583, 4.3292058583, 4.3292058583], degree=3))
        make_face()
        Polygon((9.8284865708, -50.0397120305), (9.8284865708, -50.0313035152), (8.29, -50), (8.29, -50.0240602729), align=None)
        Polygon((5.925, -50), (3.475, -50), (3.475, -100), (5.925, -100), (5.925, -52.0125), align=None)
        with BuildLine():
            add(Edge.make_bspline(
                [(5.925, -47.55), (5.2342489362, -48.7282052636), (4.4546769932, -49.3181198835), (3.475, -50)],
                knots=[0, 0, 0, 0, 3.4648232278, 3.4648232278, 3.4648232278, 3.4648232278], degree=3))
            Line((3.475, -50), (5.925, -50))
            Line((5.925, -50), (5.925, -47.55))
        make_face()
        with BuildLine():
            Line((9.8284865708, -50.079424061), (9.8284865708, -50.0397120305))
            Line((9.8284865708, -50.0397120305), (8.29, -50.0240602729))
            Line((8.29, -50.0240602729), (8.29, -53.904))
            add(Edge.make_bspline(
                [(8.29, -53.904), (8.5714472143, -52.4050904341), (9.1968655396, -51.250747129), (10.207343012, -50.079424061)],
                knots=[0, 0, 0, 0, 4.2808358806, 4.2808358806, 4.2808358806, 4.2808358806], degree=3))
            Line((10.207343012, -50.079424061), (9.8284865708, -50.079424061))
        make_face()
        Polygon((8.29, -50.0240602729), (8.29, -50), (5.925, -50), align=None)
        Polygon((8.29, -50.0240602729), (5.925, -50), (5.925, -52.0125), (5.925, -100), (8.29, -100), (8.29, -53.904), align=None)
    extrude(amount=-F6_DEPTH)


solid = f1.part
